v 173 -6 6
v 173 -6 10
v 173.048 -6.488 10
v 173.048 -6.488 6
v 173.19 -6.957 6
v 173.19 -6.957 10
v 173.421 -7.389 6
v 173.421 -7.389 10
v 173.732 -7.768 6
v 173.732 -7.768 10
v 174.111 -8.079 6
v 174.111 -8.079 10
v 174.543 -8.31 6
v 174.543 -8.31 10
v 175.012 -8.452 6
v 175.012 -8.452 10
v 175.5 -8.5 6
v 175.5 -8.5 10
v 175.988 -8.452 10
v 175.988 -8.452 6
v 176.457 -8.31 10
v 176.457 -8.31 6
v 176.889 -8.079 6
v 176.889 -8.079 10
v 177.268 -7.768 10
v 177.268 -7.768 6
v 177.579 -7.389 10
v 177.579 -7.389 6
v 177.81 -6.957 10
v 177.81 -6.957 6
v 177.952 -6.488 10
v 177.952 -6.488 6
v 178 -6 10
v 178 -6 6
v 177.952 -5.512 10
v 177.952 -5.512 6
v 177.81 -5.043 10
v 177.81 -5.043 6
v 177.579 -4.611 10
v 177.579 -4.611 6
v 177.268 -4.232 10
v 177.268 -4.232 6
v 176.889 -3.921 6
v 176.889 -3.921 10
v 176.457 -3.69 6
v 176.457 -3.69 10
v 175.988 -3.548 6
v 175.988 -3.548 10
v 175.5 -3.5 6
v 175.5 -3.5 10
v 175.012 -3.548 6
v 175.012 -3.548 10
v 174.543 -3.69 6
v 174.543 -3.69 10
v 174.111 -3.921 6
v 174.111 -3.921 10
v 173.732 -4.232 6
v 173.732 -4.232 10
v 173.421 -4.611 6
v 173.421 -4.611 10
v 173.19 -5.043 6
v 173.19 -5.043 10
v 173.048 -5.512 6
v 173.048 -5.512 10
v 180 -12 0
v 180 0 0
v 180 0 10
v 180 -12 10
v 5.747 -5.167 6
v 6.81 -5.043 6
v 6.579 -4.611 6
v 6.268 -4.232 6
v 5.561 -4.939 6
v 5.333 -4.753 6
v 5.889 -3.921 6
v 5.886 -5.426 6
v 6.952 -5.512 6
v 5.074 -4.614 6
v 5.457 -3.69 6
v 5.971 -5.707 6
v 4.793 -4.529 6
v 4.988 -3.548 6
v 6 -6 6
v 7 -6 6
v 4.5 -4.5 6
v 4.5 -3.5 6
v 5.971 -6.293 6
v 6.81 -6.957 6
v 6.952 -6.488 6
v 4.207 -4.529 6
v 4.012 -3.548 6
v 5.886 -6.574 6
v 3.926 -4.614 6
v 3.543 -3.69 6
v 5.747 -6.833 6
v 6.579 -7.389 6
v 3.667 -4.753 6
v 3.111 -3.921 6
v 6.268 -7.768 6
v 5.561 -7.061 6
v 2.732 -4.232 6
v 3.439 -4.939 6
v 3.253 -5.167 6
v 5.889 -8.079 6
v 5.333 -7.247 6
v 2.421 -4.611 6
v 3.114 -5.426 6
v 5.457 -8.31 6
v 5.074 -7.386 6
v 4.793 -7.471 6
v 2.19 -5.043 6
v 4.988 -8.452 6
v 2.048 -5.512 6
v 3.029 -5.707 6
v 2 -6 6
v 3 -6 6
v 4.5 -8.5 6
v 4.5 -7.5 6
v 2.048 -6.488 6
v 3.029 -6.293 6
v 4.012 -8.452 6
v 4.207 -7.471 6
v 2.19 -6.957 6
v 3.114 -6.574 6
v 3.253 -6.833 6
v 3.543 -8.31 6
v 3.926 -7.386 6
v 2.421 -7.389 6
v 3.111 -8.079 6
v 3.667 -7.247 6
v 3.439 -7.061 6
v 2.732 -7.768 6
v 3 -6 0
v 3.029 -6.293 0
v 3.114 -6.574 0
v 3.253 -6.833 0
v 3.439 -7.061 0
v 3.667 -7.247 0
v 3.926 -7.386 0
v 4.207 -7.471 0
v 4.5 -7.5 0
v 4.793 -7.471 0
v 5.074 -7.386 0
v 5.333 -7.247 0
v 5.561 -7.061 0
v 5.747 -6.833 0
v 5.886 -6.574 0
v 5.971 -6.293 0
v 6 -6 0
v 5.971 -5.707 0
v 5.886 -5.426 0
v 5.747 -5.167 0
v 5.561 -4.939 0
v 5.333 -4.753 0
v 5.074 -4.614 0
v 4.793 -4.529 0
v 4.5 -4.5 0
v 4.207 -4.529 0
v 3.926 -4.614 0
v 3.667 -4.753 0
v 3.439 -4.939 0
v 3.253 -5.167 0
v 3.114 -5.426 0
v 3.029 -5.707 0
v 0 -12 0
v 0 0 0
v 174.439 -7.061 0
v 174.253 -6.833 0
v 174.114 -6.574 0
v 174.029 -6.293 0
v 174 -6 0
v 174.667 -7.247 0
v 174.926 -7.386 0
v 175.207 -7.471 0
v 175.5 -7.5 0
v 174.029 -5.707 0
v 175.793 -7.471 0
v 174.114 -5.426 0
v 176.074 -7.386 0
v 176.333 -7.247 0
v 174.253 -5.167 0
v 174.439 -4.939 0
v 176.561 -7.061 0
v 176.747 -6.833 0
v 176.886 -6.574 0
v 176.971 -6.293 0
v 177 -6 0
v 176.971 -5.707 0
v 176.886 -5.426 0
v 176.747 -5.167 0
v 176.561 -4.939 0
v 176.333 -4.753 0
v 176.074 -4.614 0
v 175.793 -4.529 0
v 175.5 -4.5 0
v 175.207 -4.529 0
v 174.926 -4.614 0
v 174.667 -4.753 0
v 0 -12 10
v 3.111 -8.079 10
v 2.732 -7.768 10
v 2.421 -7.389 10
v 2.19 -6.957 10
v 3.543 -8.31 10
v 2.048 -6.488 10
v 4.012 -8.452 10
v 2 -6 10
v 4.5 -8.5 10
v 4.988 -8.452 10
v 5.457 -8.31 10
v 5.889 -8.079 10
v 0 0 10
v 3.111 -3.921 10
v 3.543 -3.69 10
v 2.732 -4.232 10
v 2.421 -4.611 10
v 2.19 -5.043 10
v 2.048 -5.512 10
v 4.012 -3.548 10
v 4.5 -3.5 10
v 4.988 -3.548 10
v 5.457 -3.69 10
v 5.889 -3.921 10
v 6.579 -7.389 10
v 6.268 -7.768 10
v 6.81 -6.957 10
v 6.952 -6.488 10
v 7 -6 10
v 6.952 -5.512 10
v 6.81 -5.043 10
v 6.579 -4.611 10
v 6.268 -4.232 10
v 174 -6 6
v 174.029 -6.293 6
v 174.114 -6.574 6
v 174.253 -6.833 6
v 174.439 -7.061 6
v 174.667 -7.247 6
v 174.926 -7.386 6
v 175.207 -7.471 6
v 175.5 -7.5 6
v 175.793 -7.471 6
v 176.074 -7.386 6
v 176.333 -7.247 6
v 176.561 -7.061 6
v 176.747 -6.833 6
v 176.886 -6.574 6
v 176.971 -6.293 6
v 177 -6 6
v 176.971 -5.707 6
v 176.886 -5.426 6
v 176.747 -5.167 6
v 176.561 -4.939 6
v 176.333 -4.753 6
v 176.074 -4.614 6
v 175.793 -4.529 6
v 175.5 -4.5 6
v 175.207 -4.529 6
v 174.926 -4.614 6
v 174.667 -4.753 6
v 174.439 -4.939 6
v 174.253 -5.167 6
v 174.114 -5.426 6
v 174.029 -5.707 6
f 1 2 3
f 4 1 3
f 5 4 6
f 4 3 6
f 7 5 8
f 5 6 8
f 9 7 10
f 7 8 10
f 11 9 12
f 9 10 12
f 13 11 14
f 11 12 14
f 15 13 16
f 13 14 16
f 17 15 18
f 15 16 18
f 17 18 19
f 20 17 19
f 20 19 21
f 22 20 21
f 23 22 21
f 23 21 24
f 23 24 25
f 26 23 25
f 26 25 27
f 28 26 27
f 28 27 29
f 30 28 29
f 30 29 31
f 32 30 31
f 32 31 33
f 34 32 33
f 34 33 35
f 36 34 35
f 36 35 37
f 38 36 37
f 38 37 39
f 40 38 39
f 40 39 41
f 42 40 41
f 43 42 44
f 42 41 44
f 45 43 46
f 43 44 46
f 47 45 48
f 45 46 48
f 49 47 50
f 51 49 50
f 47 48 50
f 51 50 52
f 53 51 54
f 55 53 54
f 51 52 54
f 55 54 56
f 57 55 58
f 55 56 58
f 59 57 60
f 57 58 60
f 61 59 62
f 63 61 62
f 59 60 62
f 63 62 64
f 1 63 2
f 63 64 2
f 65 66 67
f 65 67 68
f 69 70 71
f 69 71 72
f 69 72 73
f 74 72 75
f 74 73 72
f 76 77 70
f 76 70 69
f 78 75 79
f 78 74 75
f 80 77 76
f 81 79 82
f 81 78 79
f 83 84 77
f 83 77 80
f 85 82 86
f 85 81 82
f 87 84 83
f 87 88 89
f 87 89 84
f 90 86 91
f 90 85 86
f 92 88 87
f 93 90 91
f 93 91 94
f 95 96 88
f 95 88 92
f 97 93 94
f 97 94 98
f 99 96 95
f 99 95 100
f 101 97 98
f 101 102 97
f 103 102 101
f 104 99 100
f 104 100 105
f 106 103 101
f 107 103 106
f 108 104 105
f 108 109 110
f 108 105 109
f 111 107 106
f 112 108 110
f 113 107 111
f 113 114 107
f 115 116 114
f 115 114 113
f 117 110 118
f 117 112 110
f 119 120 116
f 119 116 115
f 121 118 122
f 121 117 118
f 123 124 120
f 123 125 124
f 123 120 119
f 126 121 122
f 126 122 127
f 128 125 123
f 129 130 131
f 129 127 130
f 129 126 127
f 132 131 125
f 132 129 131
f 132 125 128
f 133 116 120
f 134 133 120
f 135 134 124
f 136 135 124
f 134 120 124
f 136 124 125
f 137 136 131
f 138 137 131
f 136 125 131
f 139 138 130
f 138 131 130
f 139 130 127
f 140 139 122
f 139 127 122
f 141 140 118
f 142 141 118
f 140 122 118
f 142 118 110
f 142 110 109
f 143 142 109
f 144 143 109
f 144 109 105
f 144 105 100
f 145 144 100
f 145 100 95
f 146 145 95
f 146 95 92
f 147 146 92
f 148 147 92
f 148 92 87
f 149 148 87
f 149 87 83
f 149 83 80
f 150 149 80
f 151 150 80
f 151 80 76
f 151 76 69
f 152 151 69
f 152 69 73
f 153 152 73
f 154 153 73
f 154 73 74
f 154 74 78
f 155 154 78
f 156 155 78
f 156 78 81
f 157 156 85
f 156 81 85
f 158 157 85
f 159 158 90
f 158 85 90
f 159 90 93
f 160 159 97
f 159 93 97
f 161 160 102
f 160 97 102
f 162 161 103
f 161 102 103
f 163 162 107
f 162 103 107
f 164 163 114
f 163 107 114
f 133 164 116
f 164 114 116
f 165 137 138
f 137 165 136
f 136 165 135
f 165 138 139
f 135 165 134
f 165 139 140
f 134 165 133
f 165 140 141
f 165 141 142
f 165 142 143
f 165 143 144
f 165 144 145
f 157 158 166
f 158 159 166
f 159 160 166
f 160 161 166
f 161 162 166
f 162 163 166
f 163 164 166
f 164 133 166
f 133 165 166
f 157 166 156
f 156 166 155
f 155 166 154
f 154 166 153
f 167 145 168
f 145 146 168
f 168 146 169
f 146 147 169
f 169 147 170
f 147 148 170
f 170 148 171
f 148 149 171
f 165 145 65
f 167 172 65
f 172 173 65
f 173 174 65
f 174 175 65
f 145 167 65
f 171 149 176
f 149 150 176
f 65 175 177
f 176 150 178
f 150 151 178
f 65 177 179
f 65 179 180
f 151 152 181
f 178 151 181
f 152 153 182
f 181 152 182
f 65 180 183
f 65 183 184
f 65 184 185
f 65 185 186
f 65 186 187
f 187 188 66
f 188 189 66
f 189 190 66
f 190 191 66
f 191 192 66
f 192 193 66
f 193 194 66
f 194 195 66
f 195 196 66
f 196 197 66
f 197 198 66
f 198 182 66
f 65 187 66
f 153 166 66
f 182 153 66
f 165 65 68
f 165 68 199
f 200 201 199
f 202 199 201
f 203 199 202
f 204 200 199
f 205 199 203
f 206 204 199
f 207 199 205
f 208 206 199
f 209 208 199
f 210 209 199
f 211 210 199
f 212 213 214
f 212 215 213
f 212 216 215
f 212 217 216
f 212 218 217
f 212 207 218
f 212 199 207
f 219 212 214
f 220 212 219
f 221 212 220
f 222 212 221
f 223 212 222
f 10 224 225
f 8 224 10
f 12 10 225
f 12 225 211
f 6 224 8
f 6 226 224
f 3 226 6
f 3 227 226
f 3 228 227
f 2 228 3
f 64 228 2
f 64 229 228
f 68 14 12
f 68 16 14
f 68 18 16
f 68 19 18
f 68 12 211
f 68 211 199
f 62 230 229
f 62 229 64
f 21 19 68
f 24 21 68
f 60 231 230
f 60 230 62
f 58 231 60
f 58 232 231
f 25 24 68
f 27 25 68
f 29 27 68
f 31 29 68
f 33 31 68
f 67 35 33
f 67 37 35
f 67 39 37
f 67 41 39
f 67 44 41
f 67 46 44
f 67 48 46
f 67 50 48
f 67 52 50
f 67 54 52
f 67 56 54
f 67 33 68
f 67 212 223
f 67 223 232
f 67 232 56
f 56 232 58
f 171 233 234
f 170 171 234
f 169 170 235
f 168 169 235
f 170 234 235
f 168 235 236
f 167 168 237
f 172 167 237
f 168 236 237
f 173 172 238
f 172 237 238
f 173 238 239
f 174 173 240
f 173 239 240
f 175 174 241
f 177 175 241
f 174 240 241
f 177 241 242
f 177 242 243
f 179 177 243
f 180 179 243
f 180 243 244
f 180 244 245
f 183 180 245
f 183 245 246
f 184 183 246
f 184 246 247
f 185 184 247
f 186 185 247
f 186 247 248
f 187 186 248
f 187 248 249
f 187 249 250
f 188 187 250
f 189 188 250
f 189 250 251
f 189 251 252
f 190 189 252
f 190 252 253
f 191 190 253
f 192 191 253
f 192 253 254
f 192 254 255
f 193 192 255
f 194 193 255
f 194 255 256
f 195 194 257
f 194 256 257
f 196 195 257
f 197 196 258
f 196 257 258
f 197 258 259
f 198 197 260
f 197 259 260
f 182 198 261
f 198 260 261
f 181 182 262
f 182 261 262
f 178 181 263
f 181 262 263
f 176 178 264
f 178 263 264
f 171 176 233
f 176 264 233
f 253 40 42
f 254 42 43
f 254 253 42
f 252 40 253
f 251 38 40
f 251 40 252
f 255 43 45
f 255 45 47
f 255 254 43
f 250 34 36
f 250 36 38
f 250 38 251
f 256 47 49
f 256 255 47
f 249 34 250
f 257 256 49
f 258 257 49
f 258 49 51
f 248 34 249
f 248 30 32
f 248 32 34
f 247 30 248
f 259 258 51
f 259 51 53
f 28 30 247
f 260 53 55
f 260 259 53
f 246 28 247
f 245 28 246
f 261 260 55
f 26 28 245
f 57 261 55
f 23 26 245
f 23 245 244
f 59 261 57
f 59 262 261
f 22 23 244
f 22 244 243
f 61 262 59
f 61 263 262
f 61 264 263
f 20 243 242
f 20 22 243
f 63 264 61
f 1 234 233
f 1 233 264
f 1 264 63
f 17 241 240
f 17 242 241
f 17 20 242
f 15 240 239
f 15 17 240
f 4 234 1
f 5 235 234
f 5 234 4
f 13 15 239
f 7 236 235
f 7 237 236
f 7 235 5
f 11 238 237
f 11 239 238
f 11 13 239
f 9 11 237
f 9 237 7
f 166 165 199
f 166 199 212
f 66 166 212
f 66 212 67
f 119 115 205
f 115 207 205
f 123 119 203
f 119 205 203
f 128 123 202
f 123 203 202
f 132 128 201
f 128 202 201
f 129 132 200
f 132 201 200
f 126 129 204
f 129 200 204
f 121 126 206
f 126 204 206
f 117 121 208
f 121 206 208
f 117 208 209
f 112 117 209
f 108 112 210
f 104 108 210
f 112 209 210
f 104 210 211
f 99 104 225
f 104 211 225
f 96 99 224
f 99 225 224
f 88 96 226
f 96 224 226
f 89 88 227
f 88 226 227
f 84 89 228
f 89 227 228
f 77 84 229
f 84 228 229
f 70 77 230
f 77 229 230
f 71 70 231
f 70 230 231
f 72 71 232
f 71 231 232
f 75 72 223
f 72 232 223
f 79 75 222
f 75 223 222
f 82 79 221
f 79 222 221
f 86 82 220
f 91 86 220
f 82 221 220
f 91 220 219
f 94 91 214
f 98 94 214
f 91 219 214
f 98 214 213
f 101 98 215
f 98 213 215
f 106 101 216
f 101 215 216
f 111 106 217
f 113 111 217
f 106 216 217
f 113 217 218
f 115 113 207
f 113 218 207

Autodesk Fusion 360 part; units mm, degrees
sketch "Sketch1" plane through (0, 0, 0) normal (0, 0, 1) x (1, 0, 0)
  line L0 (0, 0) -> (180, 0)
  line L1 (180, 0) -> (180, -12)
  line L2 (180, -12) -> (0, -12)
  line L3 (0, -12) -> (0, 0)
  dimension "d16" = 180
  dimension "d17" = 12
extrude "Extrude1" add sketch "Sketch1" along normal blind 10
sketch "Sketch6" plane through (0, 0, 10) normal (0, 0, 1) x (-1, 0, 0)
  line L0 (0, 12) -> (-180, 12)
  line L1 (-180, 12) -> (-180, 0)
  line L2 (-180, 0) -> (0, 0)
  line L3 (0, 0) -> (0, 12)
  circle A0 centre (-4.5, 6) radius 1.5
  circle A1 centre (-4.5, 6) radius 2.5
  circle A2 centre (-175.5, 6) radius 1.5
  circle A3 centre (-175.5, 6) radius 2.5
  line L4 (0, 12) -> (0, 0)
  line L5 (0, 0) -> (-180, 0)
  line L6 (-180, 0) -> (-180, 12)
  dimension "d65" = 3
  dimension "d66" = 1
  dimension "d67" = 3
  dimension "d68" = 1
  dimension "d69" = 4.5
  dimension "d70" = 6
  dimension "d71" = 4.5
  dimension "d72" = 6
extrude "Extrude9" cut sketch "Sketch6" against normal blind 100 contours A2
extrude "Extrude10" cut sketch "Sketch6" against normal blind 4 contours A3
extrude "Extrude11" cut sketch "Sketch6" against normal blind 100 contours A0
extrude "Extrude12" cut sketch "Sketch6" against normal blind 4 contours A1
equation "length = 180 mm"
equation "height = 10 mm"
equation "width = 12 mm"
equation "d16 = length"
equation "d17 = width"
equation "d18 = height"
equation "extra = 100 mm"
equation "bearing_outer_radius = 2.5 mm"
equation "bearing_width = 4 mm"
equation "bearing_big_distance = 2 mm + bearing_outer_radius"
equation "bearing_small_distance = width / 2"
equation "bearing_inner_radius = 1.5 mm"
equation "d65 = bearing_inner_radius * 2"
equation "d66 = bearing_outer_radius - bearing_inner_radius"
equation "d67 = bearing_inner_radius * 2"
equation "d68 = bearing_outer_radius - bearing_inner_radius"
equation "d69 = bearing_big_distance"
equation "d70 = bearing_small_distance"
equation "d71 = bearing_big_distance"
equation "d72 = bearing_small_distance"
equation "d73 = -extra"
equation "d75 = -bearing_width"
equation "d77 = -extra"
equation "d79 = -bearing_width"
